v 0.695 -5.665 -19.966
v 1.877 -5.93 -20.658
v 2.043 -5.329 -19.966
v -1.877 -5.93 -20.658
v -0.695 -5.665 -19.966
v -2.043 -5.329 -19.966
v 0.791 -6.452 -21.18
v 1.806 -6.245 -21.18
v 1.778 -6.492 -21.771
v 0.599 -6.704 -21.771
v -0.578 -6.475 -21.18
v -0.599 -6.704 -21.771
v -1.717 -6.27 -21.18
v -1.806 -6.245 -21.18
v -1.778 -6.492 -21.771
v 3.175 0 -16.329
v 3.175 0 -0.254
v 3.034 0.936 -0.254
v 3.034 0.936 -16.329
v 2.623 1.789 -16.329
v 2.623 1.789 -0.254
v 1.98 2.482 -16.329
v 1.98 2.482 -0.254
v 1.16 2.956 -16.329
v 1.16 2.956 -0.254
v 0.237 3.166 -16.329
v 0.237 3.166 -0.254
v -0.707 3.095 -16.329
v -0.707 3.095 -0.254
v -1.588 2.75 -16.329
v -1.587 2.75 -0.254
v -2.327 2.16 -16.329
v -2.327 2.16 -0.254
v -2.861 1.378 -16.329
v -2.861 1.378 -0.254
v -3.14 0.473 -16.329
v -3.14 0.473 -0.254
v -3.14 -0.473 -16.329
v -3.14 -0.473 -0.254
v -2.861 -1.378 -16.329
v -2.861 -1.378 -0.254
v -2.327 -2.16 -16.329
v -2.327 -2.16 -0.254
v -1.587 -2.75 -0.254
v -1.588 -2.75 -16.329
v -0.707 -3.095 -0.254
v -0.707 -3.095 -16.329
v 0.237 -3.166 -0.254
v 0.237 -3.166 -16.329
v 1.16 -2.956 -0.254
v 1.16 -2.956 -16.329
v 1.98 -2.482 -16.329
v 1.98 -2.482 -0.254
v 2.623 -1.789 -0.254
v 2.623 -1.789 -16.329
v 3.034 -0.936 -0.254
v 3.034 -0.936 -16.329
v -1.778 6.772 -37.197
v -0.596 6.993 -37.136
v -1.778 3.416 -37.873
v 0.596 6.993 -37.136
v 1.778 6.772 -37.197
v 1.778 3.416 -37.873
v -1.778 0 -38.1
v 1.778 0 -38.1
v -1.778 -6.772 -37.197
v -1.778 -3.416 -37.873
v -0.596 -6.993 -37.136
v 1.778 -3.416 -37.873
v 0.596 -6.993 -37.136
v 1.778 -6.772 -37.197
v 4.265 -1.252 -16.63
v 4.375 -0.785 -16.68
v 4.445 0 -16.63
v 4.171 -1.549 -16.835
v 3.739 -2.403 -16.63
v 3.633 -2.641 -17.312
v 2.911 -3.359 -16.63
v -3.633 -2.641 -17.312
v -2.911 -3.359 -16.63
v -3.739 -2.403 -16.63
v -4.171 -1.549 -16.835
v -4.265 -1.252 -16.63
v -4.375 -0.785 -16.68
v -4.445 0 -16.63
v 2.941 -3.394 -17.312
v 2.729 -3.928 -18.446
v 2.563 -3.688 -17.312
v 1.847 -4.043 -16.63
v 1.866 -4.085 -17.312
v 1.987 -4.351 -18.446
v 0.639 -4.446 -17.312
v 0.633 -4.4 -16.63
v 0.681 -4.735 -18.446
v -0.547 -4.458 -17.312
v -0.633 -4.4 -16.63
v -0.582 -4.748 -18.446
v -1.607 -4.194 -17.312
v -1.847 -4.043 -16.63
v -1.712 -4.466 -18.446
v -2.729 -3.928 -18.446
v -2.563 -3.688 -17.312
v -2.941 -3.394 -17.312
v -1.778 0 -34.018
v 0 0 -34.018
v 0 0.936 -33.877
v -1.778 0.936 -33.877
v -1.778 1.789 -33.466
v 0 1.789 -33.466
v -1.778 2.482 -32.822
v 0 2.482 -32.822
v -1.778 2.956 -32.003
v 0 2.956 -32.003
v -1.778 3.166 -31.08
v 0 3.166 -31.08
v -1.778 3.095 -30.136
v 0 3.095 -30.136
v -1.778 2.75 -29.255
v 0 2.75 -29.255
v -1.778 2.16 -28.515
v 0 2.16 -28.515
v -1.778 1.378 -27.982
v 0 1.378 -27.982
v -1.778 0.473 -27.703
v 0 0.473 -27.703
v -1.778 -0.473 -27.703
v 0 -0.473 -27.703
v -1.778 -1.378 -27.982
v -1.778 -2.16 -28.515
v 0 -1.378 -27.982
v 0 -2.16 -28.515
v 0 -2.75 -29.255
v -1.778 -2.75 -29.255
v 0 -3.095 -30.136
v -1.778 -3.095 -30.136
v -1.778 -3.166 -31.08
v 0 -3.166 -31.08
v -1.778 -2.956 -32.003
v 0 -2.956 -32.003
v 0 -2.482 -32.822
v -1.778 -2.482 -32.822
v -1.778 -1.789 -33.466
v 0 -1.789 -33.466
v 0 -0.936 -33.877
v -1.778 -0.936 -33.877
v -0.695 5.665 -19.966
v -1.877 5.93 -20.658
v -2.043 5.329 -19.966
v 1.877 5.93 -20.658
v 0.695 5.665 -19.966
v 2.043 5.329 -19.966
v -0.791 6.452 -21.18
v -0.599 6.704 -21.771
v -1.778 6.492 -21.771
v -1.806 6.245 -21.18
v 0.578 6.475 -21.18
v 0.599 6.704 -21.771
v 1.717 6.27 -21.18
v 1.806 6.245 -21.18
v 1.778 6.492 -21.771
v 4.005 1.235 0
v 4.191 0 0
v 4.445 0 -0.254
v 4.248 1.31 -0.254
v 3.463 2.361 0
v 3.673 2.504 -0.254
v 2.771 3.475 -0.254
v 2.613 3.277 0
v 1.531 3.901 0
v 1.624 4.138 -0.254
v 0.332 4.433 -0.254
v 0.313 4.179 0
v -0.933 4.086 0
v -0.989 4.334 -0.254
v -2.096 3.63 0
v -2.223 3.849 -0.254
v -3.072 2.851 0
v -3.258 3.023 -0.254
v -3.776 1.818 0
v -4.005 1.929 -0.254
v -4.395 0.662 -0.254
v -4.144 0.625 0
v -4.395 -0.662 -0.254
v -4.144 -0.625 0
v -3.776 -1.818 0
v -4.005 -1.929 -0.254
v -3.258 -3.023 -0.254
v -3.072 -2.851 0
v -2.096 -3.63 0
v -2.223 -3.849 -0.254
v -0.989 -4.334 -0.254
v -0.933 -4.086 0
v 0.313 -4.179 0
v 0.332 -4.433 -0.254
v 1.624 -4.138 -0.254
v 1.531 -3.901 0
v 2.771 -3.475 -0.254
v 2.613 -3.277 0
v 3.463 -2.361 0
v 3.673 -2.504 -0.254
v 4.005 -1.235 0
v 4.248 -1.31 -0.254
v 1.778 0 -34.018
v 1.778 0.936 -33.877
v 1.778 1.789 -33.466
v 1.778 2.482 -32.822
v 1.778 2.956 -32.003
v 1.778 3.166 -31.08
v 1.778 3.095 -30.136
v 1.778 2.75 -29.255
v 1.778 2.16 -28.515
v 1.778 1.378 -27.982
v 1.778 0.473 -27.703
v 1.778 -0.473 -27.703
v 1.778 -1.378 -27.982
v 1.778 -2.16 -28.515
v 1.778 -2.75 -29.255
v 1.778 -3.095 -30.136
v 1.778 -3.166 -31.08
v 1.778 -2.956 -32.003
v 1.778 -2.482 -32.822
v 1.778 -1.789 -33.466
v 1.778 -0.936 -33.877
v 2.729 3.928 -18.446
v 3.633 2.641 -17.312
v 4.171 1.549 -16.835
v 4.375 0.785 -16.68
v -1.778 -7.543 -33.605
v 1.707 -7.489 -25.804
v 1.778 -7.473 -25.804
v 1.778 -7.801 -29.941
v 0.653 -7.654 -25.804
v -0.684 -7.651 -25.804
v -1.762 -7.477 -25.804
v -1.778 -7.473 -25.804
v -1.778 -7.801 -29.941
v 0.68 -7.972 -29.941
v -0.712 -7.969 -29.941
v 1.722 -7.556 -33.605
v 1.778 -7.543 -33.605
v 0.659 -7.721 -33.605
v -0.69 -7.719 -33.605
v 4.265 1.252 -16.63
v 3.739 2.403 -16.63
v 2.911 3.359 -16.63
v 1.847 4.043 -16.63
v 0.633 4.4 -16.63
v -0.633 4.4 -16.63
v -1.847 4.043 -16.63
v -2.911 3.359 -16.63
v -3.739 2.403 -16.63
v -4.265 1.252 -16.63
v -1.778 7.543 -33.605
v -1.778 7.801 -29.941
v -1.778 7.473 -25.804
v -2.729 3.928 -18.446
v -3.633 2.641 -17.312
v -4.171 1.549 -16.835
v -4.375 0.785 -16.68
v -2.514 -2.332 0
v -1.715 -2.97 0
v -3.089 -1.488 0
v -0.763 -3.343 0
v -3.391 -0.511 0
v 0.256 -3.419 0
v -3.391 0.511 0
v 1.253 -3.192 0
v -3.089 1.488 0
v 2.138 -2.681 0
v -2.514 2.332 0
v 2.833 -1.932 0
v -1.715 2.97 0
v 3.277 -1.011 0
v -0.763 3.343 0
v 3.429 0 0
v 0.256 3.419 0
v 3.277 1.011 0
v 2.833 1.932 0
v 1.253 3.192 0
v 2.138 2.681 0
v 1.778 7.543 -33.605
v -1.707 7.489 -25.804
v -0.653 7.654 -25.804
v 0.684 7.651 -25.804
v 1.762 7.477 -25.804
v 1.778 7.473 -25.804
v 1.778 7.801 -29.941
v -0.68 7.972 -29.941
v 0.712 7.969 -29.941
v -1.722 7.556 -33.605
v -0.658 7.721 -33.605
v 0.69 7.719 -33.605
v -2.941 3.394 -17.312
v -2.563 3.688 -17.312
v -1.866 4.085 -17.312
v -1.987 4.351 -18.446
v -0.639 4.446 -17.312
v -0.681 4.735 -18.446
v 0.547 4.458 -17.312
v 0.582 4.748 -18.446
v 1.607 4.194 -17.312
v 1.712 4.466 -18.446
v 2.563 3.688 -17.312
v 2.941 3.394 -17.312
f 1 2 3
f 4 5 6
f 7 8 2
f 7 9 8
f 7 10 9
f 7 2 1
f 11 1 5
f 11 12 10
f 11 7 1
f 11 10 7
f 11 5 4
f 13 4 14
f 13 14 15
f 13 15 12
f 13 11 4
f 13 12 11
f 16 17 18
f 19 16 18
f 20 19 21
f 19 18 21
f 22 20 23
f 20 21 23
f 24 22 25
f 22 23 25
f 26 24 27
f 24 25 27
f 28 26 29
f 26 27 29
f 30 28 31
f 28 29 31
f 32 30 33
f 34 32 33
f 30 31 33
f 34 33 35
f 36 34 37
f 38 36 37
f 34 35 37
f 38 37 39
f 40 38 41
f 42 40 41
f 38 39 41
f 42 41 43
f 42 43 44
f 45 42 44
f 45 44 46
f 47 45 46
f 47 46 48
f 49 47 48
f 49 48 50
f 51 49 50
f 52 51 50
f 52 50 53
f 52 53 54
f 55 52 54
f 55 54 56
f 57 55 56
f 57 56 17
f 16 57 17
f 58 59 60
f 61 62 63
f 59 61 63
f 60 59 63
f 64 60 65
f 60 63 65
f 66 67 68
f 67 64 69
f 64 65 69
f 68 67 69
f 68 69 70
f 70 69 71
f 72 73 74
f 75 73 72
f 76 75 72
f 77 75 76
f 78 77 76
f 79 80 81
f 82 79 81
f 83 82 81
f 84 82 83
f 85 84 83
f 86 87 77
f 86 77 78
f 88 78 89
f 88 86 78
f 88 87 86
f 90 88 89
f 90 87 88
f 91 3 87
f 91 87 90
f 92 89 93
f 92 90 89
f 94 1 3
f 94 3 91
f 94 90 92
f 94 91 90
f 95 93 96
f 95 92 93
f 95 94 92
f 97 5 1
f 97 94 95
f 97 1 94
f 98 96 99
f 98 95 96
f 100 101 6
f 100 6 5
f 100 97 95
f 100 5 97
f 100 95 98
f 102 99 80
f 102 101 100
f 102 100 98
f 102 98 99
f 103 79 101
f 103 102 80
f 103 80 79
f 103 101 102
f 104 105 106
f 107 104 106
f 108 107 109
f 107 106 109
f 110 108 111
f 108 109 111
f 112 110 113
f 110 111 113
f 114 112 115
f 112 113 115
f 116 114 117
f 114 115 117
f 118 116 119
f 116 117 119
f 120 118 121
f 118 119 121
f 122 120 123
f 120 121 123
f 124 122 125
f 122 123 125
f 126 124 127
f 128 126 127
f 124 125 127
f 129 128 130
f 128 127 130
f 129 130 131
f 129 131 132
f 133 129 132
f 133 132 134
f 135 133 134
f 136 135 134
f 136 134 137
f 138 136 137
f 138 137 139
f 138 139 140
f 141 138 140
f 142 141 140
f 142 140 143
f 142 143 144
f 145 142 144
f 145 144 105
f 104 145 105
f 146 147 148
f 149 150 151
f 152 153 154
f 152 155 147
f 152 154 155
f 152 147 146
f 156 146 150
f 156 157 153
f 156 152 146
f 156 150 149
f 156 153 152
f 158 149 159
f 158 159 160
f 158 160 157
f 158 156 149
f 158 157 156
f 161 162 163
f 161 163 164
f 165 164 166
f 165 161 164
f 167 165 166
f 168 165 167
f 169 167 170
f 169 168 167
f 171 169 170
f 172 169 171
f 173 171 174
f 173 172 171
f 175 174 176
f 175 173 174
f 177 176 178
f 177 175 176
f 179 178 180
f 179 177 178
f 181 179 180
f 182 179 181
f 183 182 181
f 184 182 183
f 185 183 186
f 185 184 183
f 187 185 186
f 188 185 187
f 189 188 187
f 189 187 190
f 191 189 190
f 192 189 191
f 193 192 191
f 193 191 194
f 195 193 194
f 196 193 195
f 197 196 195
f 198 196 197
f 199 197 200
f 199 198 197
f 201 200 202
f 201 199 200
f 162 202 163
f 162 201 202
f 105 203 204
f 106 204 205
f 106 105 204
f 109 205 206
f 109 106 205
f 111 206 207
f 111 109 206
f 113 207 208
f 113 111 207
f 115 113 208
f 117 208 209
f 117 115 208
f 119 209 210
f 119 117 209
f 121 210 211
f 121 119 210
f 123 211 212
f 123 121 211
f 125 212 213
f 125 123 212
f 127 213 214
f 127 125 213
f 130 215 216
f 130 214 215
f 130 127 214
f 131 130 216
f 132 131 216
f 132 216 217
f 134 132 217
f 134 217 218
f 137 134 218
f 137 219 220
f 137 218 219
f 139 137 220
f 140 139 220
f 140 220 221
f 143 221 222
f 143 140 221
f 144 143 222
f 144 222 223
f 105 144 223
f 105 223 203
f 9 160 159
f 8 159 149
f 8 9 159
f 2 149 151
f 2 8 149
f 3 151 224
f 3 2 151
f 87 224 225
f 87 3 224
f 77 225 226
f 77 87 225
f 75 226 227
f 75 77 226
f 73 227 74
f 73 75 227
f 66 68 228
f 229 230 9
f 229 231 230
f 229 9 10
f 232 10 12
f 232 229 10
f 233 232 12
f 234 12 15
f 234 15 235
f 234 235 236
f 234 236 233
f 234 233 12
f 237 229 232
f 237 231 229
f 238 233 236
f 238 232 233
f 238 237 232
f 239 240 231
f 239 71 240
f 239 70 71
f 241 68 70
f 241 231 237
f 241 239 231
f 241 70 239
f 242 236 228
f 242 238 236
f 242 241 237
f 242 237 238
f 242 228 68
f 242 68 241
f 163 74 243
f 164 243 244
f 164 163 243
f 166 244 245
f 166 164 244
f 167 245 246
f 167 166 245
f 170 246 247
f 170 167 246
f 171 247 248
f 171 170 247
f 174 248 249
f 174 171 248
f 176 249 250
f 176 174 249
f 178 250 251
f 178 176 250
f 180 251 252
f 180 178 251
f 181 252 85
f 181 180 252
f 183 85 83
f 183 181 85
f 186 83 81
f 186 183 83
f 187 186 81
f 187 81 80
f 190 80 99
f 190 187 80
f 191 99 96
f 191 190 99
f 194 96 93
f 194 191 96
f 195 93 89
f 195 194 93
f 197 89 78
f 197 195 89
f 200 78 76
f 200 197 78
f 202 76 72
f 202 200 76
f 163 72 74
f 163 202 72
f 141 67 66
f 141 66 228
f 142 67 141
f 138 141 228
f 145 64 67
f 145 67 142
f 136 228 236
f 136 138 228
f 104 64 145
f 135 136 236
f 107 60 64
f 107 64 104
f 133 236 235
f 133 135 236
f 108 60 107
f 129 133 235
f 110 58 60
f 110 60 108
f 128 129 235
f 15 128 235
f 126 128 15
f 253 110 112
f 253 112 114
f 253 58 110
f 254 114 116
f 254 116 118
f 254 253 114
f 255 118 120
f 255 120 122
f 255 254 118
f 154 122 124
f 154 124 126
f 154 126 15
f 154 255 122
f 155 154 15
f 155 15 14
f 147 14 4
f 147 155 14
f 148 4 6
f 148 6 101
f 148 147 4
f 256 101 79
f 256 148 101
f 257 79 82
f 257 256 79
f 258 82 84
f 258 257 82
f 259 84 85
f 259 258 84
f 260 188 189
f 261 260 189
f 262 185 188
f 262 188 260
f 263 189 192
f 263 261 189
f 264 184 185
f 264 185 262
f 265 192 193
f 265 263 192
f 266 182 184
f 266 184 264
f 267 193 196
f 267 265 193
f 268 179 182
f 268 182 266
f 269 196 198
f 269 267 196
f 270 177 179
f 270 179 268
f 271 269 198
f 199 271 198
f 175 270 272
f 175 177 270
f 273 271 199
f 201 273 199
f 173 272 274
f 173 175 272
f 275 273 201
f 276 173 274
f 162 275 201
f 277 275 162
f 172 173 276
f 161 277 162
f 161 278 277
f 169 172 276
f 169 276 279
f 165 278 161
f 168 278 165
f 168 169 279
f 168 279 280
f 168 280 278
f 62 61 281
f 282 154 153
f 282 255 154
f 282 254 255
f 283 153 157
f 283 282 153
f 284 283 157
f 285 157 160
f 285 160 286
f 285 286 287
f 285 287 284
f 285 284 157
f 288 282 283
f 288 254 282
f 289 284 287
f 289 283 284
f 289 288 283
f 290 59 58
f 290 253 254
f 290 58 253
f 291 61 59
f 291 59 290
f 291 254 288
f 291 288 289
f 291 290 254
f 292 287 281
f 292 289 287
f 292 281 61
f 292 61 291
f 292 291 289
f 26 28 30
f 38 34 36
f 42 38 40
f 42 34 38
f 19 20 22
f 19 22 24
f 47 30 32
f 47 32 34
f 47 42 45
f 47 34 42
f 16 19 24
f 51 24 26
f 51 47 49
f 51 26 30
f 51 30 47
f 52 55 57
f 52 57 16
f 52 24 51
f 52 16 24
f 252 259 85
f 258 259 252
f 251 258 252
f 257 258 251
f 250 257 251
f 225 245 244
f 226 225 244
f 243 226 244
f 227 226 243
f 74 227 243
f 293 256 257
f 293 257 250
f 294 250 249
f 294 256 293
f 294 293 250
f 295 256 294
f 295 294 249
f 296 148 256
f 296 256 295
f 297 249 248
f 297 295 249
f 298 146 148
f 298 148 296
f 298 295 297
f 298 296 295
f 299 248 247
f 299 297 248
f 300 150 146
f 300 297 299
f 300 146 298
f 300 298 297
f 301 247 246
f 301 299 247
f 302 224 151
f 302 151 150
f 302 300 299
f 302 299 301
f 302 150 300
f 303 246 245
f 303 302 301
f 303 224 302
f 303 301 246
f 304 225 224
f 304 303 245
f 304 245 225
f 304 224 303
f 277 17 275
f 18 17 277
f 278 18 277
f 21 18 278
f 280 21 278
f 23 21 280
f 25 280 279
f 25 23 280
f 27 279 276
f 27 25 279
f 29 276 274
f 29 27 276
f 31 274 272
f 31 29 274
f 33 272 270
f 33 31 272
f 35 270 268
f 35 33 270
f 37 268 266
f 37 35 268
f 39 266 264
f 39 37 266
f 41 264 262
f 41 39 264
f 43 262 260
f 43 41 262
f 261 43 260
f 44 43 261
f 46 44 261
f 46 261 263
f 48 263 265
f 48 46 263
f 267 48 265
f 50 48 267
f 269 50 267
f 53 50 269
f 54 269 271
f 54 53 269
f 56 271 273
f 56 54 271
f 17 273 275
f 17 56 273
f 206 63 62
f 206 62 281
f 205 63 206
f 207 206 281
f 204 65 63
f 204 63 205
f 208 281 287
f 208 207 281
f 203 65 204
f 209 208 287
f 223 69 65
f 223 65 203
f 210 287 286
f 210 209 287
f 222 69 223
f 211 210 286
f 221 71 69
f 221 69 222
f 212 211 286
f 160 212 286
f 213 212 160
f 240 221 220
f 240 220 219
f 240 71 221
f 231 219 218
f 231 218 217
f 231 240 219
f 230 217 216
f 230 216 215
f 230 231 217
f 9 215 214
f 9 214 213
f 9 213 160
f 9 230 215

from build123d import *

# Parameters (mm, degrees)
SKETCH1_R           = 4.445
EXTRUDE1_DEPTH      = 38.1
SKETCH32_R          = 3.175
CUT_EXTRUDE9_DEPTH  = 39.615101321
SKETCH34_R          = 3.429
CUT_EXTRUDE11_DEPTH = 1.524
CUT_EXTRUDE11_DRAFT = -45
CHAMFER1_SIZE       = 0.254
SKETCH30_R          = 3.175
CUT_EXTRUDE7_DEPTH  = 12.7
CUT_EXTRUDE8_DEPTH  = 12.7


with BuildPart() as part:
    # Sketch1 → Extrude1 (new body)
    with BuildSketch(Plane.XY):
        Circle(SKETCH1_R)
    extrude(amount=-EXTRUDE1_DEPTH)

    # Sketch32 → Cut-Extrude9 (cut, through all)
    with BuildSketch(Plane.XY):
        Circle(SKETCH32_R)
    extrude(amount=-CUT_EXTRUDE9_DEPTH, mode=Mode.SUBTRACT)


with BuildPart() as cut_extrude11_tool:
    # Sketch34 → Cut-Extrude11 (with draft: the straight prism first)
    with BuildSketch(Plane.XY):
        Circle(SKETCH34_R)
    extrude(amount=-CUT_EXTRUDE11_DEPTH)
    # Cut-Extrude11: the draft: its side faces are tilted about the plane it starts from
    cut_extrude11_sides = [cut_extrude11_tool.faces().sort_by_distance(p)[0] for p in [
        (-3.429, 0, -0.762),
    ]]
    draft(cut_extrude11_sides, Plane.XY, CUT_EXTRUDE11_DRAFT)


with BuildPart() as part_1:
    add(part.part)

    # Cut-Extrude11: cut by cut_extrude11_tool
    add(cut_extrude11_tool.part, mode=Mode.SUBTRACT)

    # Chamfer1
    chamfer1_edges = [part_1.edges().sort_by_distance(p)[0] for p in [
        (-4.445, 0, 0),
    ]]
    chamfer(chamfer1_edges, length=CHAMFER1_SIZE)

    # Sketch29 → Revolve2 (revolve)
    with BuildSketch(Plane(origin=(0, 0, 0), x_dir=(0, 0, -1), z_dir=(1, 0, 0))):
        with BuildLine():
            Line((16.328571429, 0), (16.328571429, 2.350110803))
            Line((16.328571429, 2.350110803), (16.328571429, 4.445))
            Line((16.328571429, 4.445), (16.630196429, 4.445))
            ThreePointArc((16.630196429, 4.445), (18.413645234, 4.771067643), (19.966347576, 5.707083234))
            ThreePointArc((19.966347576, 5.707083234), (20.815620725, 6.31294757), (21.771428571, 6.731))
            ThreePointArc((21.771428571, 6.731), (29.935714286, 8.001), (38.1, 6.731))
            Line((38.1, 6.731), (38.1, 0))
            Line((38.1, 0), (16.328571429, 0))
        make_face()
    revolve(axis=Axis((0, 0, 0), (0, 0, -1)))

    # Sketch30 → Cut-Extrude7 (cut, symmetric)
    with BuildSketch(Plane(origin=(0, 0, 0), x_dir=(0, 0, -1), z_dir=(1, 0, 0))):
        with Locations((30.842857143, 0)):
            Circle(SKETCH30_R)
        with BuildLine():
            Line((44.45, 8.001), (36.83, 8.001))
            ThreePointArc((36.83, 8.001), (38.1, 0), (36.83, -8.001))
            Line((36.83, -8.001), (44.45, -8.001))
            Line((44.45, -8.001), (44.45, 8.001))
        make_face()
    extrude(amount=CUT_EXTRUDE7_DEPTH, both=True, mode=Mode.SUBTRACT)

    # Sketch31 → Cut-Extrude8 (cut, symmetric)
    with BuildSketch(Plane(origin=(0, 0, 0), x_dir=(1, 0, 0), z_dir=(0, 1, 0))):
        with BuildLine():
            Line((1.778, 38.1), (1.778, 21.771428571))
            ThreePointArc((1.778, 21.771428571), (2.484425862, 18.87551952), (4.445, 16.630196429))
            Line((4.445, 16.630196429), (14.478, 16.630196429))
            Line((14.478, 16.630196429), (14.478, 38.1))
            Line((14.478, 38.1), (1.778, 38.1))
        make_face()
        with BuildLine():
            Line((-1.778, 38.1), (-1.778, 21.771428571))
            ThreePointArc((-1.778, 21.771428571), (-2.484425862, 18.87551952), (-4.445, 16.630196429))
            Line((-4.445, 16.630196429), (-14.478, 16.630196429))
            Line((-14.478, 16.630196429), (-14.478, 38.1))
            Line((-14.478, 38.1), (-1.778, 38.1))
        make_face()
    extrude(amount=CUT_EXTRUDE8_DEPTH, both=True, mode=Mode.SUBTRACT)


solid = part_1.part
